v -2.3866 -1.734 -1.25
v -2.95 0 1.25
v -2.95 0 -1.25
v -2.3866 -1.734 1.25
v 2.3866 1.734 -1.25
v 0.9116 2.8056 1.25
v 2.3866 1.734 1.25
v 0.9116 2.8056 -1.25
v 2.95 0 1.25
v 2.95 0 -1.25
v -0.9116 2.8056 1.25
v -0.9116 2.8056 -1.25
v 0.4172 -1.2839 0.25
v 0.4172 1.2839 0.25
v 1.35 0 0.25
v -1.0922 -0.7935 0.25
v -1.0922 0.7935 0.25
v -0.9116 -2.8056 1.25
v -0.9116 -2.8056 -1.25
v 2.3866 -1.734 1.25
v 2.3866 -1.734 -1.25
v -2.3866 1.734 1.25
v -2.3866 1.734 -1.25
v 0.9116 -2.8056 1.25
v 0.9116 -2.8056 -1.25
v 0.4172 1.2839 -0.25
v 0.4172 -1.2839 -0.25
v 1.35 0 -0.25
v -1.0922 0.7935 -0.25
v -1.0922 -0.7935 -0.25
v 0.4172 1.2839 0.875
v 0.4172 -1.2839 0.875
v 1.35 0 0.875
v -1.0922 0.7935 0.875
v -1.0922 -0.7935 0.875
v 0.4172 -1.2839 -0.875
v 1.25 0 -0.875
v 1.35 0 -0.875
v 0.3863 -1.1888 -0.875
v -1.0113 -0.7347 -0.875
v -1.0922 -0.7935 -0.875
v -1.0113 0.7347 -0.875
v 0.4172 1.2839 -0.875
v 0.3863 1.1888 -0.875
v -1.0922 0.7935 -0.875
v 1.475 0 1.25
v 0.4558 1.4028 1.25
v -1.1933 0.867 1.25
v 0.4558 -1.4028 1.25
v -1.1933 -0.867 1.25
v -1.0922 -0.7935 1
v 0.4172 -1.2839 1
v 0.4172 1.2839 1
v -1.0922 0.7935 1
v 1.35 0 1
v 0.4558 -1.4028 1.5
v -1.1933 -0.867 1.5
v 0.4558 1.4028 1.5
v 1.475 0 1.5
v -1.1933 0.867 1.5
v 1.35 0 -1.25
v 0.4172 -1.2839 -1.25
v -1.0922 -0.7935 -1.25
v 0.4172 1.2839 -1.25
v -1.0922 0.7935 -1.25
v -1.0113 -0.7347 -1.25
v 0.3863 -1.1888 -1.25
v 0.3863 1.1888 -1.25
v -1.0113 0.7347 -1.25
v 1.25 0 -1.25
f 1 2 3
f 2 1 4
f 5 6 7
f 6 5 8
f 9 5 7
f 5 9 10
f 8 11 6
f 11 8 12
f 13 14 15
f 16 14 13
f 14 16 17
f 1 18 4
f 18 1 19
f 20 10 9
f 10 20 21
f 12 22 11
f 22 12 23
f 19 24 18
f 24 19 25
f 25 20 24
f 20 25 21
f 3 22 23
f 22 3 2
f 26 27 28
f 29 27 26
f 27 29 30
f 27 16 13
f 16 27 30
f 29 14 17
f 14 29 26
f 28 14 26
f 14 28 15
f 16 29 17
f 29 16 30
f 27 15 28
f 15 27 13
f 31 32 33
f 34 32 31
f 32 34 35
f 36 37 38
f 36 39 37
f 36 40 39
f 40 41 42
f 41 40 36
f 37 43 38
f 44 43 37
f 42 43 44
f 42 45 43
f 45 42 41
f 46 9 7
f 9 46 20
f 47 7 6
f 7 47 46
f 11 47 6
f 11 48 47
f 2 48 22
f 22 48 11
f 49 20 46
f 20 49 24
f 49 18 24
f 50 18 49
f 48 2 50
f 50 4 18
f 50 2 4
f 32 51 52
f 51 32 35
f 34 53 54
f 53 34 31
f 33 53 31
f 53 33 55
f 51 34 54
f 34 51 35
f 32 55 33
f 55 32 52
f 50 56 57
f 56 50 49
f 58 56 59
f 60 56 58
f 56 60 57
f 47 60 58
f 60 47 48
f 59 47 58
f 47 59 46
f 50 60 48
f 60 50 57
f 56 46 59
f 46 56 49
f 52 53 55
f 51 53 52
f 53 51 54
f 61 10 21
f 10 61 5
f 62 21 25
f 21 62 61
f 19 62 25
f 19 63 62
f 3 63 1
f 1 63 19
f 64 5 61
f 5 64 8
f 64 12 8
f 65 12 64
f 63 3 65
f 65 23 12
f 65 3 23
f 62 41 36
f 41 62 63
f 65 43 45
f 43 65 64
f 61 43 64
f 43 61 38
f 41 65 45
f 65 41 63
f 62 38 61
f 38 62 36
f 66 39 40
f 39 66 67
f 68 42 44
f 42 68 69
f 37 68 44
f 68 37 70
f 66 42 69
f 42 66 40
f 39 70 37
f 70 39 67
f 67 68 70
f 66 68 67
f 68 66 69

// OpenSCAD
// Parameters
inner_diameter_mm = 2.5; //[1.25:5:0.05]
outer_diameter_mm = 5.9; //[2.95:11.8:0.05]
thickness_mm = 0.5; //[0.25:1:0.05]
inner_radius_mm = 1.25; //[0.625:2.5:0.05]
outer_radius_mm = 2.95; //[1.475:5.9:0.05]
hole_clearance_mm = 0.1; //[0:0.3:0.01]
cut_extra_height_mm = 1; //[0.5:3:0.1]

// Washer - base geometry
module washer_body() {
  difference() {
    cylinder(r=outer_radius_mm, h=thickness_mm, center=true);
    cylinder(r=inner_radius_mm + hole_clearance_mm, h=thickness_mm + cut_extra_height_mm, center=true);
  }
}

// Round Grommet Top - detailed geometry
module round_grommet_top() {
  color("Silver") {
    cylinder(r=outer_radius_mm, h=thickness_mm, center=true);
    translate([0, 0, thickness_mm/2])
      cylinder(r=outer_radius_mm/2, h=thickness_mm/2, center=true);
  }
}

// Round Grommet Assembly - detailed geometry
module round_grommet_assembly() {
  color("DimGray") {
    cylinder(r=outer_radius_mm, h=thickness_mm, center=true);
    translate([0, 0, -thickness_mm/2])
      cylinder(r=outer_radius_mm/2, h=thickness_mm/2, center=true);
  }
}

// Nut And Washer - detailed geometry
module nut_and_washer() {
  color("Black") {
    washer_body();
    translate([0, 0, thickness_mm/2])
      cylinder(r=outer_radius_mm/2, h=thickness_mm, center=true);
  }
}

// Screw And Washer - detailed geometry
module screw_and_washer() {
  color("Silver") {
    washer_body();
    translate([0, 0, thickness_mm/2])
      cylinder(r=inner_radius_mm, h=thickness_mm * 2, center=true);
  }
}

// Assembly - combines all parts
module assembly() {
  translate([0, 0, 0]) washer_body();
  translate([0, 0, thickness_mm]) round_grommet_top();
  translate([0, 0, -thickness_mm]) round_grommet_assembly();
  translate([0, 0, thickness_mm * 2]) nut_and_washer();
  translate([0, 0, -thickness_mm * 2]) screw_and_washer();
}

assembly();
